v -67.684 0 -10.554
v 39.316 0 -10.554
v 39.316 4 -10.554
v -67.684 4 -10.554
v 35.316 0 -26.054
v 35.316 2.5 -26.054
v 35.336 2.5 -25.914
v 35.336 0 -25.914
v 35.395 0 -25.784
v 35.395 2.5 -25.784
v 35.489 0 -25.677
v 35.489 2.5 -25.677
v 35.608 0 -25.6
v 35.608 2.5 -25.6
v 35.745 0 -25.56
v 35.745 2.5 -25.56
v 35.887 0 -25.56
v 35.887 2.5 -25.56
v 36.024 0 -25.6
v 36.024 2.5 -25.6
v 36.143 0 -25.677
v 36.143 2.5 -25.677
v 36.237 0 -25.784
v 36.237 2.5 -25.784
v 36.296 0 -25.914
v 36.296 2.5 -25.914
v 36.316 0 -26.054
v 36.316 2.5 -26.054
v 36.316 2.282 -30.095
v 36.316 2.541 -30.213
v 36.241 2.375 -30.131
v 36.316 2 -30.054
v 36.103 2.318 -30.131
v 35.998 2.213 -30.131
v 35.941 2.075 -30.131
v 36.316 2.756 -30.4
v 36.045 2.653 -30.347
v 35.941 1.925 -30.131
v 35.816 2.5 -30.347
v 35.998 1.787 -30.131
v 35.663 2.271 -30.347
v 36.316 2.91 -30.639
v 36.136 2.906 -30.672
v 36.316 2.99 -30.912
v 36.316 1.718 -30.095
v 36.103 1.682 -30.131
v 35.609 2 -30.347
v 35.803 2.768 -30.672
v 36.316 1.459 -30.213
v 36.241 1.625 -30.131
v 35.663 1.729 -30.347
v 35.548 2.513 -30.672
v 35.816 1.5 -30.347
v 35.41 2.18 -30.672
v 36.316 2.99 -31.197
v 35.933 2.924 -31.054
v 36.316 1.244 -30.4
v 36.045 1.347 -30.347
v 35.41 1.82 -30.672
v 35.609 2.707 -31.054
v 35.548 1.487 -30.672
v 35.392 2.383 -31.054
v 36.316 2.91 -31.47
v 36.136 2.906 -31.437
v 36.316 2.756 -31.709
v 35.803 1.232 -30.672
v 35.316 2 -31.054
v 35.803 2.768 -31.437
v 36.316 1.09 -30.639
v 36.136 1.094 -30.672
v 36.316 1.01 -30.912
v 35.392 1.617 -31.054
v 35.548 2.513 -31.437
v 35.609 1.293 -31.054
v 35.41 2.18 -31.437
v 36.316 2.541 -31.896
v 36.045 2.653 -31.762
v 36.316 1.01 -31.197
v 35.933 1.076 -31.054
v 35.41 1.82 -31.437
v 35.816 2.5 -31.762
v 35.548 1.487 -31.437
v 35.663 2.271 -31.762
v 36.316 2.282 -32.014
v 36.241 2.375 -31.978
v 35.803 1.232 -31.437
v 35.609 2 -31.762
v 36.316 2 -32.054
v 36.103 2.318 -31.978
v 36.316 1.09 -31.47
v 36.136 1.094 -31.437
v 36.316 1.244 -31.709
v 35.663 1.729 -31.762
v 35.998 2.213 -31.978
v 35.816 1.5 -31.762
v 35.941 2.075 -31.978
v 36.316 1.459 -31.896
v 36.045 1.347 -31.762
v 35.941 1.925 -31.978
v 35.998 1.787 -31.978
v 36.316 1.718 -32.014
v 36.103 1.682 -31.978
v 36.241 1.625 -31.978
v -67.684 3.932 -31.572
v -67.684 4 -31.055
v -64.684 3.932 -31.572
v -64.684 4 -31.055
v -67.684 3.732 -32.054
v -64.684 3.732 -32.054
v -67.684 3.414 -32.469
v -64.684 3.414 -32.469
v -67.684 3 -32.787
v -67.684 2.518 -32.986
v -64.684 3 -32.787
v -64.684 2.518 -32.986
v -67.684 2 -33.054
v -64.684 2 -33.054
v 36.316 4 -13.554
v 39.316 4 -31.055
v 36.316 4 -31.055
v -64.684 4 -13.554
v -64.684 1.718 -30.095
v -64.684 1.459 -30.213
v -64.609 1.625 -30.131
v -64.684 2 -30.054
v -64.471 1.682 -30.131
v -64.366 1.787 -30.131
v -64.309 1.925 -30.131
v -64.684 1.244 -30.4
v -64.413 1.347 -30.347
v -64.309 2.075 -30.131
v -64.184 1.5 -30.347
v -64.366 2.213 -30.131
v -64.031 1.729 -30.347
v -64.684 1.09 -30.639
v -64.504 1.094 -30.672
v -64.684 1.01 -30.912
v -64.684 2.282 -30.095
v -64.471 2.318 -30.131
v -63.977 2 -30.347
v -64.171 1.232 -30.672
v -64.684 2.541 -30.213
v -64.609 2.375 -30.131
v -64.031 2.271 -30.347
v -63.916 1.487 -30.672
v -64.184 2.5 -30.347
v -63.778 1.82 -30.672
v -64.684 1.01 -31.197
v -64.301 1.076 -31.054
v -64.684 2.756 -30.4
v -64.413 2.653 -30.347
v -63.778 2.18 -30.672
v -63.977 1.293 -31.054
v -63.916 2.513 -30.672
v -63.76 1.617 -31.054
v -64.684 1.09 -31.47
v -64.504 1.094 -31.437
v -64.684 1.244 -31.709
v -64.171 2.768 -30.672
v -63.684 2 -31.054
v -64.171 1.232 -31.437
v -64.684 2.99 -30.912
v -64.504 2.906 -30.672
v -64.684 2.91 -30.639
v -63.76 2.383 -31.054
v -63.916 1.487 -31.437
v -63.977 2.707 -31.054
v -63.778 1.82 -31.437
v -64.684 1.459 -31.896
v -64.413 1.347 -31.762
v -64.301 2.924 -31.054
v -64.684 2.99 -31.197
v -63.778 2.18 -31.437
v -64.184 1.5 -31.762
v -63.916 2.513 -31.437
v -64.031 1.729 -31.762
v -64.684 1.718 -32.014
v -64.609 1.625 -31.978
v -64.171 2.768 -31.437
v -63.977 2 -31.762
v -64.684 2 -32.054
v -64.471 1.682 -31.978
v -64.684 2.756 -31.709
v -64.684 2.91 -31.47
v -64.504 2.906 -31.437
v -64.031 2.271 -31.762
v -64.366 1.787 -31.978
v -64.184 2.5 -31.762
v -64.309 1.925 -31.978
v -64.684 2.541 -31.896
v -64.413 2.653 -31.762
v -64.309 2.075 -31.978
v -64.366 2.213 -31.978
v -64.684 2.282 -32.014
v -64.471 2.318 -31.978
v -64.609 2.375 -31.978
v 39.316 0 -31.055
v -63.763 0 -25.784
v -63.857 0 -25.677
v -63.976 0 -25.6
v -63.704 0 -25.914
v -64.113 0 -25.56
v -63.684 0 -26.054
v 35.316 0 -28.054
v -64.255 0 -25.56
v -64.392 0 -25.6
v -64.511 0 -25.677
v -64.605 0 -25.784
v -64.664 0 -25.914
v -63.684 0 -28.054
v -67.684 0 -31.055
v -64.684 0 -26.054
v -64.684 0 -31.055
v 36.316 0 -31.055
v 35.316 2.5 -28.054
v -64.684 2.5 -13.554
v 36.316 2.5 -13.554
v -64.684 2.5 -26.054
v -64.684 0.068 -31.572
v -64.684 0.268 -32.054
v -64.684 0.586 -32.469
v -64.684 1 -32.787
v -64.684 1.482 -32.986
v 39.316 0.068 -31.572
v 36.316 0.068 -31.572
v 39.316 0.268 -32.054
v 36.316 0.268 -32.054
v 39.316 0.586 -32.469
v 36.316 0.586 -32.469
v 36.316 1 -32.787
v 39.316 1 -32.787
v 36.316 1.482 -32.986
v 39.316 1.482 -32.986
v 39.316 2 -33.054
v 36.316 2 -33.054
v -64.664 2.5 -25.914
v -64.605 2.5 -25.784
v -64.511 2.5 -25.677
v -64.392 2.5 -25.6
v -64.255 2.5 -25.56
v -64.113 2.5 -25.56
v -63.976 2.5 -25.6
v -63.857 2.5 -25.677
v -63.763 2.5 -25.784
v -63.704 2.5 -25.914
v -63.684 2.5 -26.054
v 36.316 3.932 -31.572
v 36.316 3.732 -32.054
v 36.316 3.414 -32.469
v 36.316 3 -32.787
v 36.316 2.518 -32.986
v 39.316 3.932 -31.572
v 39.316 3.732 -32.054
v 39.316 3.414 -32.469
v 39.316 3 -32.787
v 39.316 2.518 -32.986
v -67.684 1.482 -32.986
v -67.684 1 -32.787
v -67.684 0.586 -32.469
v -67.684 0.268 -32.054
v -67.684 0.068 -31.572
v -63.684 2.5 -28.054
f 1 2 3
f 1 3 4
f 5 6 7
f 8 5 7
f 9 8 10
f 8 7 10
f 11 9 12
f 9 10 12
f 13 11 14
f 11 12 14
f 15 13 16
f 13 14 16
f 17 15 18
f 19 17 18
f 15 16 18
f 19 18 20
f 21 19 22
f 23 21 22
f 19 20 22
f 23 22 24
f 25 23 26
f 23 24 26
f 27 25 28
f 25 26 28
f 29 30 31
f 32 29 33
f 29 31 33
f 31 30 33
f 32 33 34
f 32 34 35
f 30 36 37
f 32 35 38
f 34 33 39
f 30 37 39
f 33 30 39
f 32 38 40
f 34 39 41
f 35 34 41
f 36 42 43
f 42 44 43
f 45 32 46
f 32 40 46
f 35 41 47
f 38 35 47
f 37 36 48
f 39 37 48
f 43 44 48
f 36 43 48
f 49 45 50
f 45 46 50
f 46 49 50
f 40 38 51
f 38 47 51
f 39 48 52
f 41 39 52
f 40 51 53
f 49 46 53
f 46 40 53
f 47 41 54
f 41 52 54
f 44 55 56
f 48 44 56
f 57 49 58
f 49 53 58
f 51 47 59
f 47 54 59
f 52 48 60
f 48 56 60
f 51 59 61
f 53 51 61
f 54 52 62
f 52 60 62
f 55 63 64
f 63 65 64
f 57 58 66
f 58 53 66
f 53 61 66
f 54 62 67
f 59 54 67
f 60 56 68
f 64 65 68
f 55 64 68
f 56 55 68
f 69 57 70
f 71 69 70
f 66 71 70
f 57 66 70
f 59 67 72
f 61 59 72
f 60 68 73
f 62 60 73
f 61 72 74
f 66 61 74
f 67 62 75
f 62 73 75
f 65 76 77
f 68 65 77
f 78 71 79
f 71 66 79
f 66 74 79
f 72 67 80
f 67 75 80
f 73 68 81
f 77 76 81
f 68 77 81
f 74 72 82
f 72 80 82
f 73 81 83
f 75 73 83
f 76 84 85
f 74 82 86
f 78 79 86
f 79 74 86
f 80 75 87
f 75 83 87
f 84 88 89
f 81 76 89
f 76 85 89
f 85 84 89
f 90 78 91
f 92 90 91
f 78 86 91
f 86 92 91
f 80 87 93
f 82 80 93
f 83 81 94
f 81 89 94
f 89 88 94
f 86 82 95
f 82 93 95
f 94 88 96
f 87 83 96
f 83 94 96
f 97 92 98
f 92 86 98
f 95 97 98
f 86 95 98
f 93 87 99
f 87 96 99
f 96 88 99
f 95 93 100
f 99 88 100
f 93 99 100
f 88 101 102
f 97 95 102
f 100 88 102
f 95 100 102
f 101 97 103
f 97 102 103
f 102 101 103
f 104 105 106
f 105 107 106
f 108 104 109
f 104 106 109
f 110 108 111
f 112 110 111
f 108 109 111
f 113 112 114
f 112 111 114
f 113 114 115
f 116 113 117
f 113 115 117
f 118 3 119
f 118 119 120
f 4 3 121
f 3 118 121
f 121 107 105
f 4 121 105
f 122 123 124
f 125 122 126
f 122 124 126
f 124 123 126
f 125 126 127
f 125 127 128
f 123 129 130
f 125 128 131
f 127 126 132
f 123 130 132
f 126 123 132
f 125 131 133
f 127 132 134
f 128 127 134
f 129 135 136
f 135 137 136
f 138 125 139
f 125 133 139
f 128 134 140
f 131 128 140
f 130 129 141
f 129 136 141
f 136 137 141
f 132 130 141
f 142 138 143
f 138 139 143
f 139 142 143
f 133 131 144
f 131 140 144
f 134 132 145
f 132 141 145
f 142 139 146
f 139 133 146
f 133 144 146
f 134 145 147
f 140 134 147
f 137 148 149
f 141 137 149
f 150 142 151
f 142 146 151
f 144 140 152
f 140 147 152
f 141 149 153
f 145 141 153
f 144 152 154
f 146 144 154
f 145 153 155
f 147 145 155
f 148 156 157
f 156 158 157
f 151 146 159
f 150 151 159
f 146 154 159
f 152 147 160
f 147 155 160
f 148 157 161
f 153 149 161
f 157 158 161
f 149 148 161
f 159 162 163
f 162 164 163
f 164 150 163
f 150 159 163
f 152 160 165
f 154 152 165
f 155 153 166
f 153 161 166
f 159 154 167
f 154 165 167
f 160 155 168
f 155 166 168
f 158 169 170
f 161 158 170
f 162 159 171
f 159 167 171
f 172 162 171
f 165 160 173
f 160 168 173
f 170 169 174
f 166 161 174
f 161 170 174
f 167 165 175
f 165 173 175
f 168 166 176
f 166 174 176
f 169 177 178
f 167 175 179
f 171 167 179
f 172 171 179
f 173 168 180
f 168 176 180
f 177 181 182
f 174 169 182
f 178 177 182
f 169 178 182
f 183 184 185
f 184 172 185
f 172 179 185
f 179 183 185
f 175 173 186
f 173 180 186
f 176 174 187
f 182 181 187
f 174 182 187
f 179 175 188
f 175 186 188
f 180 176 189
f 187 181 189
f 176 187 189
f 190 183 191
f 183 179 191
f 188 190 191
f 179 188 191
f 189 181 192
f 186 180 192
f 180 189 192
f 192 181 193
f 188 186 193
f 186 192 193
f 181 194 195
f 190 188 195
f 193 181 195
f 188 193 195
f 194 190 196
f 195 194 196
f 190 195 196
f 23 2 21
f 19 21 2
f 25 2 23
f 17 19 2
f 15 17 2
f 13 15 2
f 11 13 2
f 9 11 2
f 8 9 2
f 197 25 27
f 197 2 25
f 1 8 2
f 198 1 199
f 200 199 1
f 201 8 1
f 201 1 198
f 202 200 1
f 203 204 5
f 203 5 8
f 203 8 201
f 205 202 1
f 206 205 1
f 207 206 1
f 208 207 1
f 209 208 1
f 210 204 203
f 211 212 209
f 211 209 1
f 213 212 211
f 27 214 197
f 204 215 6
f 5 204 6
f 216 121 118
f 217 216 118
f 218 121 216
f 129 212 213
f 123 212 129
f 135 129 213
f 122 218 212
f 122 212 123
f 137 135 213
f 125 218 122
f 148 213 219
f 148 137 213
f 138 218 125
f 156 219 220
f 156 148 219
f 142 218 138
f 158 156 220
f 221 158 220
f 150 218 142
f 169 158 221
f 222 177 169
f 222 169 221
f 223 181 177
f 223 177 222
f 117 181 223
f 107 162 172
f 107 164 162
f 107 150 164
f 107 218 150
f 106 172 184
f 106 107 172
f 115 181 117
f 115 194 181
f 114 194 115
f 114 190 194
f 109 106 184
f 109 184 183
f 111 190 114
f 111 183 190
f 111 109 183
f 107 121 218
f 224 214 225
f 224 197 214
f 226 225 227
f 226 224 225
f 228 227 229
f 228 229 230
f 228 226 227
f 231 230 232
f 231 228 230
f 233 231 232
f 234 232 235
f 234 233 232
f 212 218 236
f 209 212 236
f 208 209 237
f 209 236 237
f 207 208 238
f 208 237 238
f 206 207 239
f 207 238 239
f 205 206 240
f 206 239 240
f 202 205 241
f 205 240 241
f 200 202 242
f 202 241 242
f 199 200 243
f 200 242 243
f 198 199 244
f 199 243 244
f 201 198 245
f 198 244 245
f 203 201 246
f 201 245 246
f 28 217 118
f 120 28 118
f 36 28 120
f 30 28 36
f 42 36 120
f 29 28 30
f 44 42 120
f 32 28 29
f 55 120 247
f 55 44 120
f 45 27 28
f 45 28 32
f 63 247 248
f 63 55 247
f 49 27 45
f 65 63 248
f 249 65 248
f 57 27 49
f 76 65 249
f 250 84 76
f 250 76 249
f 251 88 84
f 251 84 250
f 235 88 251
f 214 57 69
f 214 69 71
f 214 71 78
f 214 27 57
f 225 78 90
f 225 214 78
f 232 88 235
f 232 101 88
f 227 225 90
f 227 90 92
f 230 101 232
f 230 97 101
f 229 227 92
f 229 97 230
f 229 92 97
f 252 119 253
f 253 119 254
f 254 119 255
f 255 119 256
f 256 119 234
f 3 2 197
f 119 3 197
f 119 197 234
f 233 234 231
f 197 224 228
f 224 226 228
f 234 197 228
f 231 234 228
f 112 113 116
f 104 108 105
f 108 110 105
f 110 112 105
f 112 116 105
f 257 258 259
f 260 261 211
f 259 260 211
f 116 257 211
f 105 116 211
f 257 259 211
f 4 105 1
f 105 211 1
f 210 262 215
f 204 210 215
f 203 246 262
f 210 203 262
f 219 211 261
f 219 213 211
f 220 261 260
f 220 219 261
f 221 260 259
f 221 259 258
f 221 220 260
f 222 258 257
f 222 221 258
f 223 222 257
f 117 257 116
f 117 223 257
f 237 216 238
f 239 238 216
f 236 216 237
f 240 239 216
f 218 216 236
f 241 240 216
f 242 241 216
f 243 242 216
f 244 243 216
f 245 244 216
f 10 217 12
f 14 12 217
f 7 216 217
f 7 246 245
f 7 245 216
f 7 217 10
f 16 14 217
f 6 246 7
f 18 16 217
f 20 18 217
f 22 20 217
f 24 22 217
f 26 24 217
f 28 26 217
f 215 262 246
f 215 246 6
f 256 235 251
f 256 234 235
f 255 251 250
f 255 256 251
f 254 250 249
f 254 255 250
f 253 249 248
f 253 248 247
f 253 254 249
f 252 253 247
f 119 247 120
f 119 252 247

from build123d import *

# Parameters (mm, degrees)
SALIENTE_EXTRUIR1_DEPTH = 4
CROQUIS4_W              = 99
CROQUIS4_H              = 2
CORTAR_EXTRUIR1_DEPTH   = 10
REDONDEO1_R             = 2
CROQUIS5_W              = 101
CROQUIS5_H              = 16.071267716
CORTAR_EXTRUIR2_DEPTH   = 1.5


with BuildPart() as part:
    # Croquis1 → Saliente-Extruir1 (new body)
    with BuildSketch(Plane(origin=(0, 0, 0), x_dir=(1, 0, 0), z_dir=(0, 1, 0))):
        Polygon((-64.683943666, 30.054443615), (36.316056334, 30.054443615), (36.316056334, 33.054443615), (39.316056334, 33.054443615), (39.316056334, 30.054443615), (39.316056334, 10.554443615), (-67.683943666, 10.554443615), (-67.683943666, 30.054443615), (-67.683943666, 33.054443615), (-64.683943666, 33.054443615), align=None)
    extrude(amount=SALIENTE_EXTRUIR1_DEPTH)

    # Croquis4 → Cortar-Extruir1 (cut)
    with BuildSketch(Plane(origin=(0, 4, 0), x_dir=(1, 0, 0), z_dir=(0, 1, 0))):
        with Locations((-14.183943666, 29.054443615)):
            Rectangle(CROQUIS4_W, CROQUIS4_H)
        with BuildLine():
            Line((36.316056334, 26.054443615), (36.316056334, 30.054443615))
            Line((36.316056334, 30.054443615), (35.316056334, 30.054443615))
            Line((35.316056334, 30.054443615), (35.316056334, 28.054443615))
            Line((35.316056334, 28.054443615), (35.316056334, 26.054443615))
            ThreePointArc((35.316056334, 26.054443615), (35.816056334, 25.554443615), (36.316056334, 26.054443615))
        make_face()
        with BuildLine():
            Line((-63.683943666, 28.054443615), (-63.683943666, 30.054443615))
            Line((-63.683943666, 30.054443615), (-64.683943666, 30.054443615))
            Line((-64.683943666, 30.054443615), (-64.683943666, 26.054443615))
            ThreePointArc((-64.683943666, 26.054443615), (-64.183943666, 25.554443615), (-63.683943666, 26.054443615))
            Line((-63.683943666, 26.054443615), (-63.683943666, 28.054443615))
        make_face()
    extrude(amount=-CORTAR_EXTRUIR1_DEPTH, mode=Mode.SUBTRACT)

    # Redondeo1
    redondeo1_edges = [part.edges().sort_by_distance(p)[0] for p in [
        (-66.183943666, 0, -33.054443615),
        (-66.183943666, 4, -33.054443615),
        (37.816056334, 0, -33.054443615),
        (37.816056334, 4, -33.054443615),
    ]]
    fillet(redondeo1_edges, radius=REDONDEO1_R - 0.0001)  # a hair under: the kernel refuses the full size

    # Croquis3 → Revolución1 (revolve)
    with BuildSketch(Plane(origin=(-64.683943666, 0, 0), x_dir=(0, 0, -1), z_dir=(1, 0, 0))):
        with BuildLine():
            Line((32.054443615, 2), (30.054443615, 2))
            ThreePointArc((30.054443615, 2), (31.054443615, 1), (32.054443615, 2))
        make_face()
    revolve(axis=Axis((-64.683943666, 2, -32.054443615), (0, 0, 1)))

    # Croquis2 → Revolución2 (revolve)
    with BuildSketch(Plane.ZY.offset(-36.316056334)):
        with BuildLine():
            Line((-32.054443615, 2), (-30.054443615, 2))
            ThreePointArc((-30.054443615, 2), (-31.054443615, 1), (-32.054443615, 2))
        make_face()
    revolve(axis=Axis((36.316056334, 2, -32.054443615), (0, 0, 1)))

    # Croquis5 → Cortar-Extruir2 (cut)
    with BuildSketch(Plane(origin=(0, 4, 0), x_dir=(1, 0, 0), z_dir=(0, 1, 0))):
        with Locations((-14.183943666, 21.590077473)):
            Rectangle(CROQUIS5_W, CROQUIS5_H)
    extrude(amount=-CORTAR_EXTRUIR2_DEPTH, mode=Mode.SUBTRACT)


solid = part.part
